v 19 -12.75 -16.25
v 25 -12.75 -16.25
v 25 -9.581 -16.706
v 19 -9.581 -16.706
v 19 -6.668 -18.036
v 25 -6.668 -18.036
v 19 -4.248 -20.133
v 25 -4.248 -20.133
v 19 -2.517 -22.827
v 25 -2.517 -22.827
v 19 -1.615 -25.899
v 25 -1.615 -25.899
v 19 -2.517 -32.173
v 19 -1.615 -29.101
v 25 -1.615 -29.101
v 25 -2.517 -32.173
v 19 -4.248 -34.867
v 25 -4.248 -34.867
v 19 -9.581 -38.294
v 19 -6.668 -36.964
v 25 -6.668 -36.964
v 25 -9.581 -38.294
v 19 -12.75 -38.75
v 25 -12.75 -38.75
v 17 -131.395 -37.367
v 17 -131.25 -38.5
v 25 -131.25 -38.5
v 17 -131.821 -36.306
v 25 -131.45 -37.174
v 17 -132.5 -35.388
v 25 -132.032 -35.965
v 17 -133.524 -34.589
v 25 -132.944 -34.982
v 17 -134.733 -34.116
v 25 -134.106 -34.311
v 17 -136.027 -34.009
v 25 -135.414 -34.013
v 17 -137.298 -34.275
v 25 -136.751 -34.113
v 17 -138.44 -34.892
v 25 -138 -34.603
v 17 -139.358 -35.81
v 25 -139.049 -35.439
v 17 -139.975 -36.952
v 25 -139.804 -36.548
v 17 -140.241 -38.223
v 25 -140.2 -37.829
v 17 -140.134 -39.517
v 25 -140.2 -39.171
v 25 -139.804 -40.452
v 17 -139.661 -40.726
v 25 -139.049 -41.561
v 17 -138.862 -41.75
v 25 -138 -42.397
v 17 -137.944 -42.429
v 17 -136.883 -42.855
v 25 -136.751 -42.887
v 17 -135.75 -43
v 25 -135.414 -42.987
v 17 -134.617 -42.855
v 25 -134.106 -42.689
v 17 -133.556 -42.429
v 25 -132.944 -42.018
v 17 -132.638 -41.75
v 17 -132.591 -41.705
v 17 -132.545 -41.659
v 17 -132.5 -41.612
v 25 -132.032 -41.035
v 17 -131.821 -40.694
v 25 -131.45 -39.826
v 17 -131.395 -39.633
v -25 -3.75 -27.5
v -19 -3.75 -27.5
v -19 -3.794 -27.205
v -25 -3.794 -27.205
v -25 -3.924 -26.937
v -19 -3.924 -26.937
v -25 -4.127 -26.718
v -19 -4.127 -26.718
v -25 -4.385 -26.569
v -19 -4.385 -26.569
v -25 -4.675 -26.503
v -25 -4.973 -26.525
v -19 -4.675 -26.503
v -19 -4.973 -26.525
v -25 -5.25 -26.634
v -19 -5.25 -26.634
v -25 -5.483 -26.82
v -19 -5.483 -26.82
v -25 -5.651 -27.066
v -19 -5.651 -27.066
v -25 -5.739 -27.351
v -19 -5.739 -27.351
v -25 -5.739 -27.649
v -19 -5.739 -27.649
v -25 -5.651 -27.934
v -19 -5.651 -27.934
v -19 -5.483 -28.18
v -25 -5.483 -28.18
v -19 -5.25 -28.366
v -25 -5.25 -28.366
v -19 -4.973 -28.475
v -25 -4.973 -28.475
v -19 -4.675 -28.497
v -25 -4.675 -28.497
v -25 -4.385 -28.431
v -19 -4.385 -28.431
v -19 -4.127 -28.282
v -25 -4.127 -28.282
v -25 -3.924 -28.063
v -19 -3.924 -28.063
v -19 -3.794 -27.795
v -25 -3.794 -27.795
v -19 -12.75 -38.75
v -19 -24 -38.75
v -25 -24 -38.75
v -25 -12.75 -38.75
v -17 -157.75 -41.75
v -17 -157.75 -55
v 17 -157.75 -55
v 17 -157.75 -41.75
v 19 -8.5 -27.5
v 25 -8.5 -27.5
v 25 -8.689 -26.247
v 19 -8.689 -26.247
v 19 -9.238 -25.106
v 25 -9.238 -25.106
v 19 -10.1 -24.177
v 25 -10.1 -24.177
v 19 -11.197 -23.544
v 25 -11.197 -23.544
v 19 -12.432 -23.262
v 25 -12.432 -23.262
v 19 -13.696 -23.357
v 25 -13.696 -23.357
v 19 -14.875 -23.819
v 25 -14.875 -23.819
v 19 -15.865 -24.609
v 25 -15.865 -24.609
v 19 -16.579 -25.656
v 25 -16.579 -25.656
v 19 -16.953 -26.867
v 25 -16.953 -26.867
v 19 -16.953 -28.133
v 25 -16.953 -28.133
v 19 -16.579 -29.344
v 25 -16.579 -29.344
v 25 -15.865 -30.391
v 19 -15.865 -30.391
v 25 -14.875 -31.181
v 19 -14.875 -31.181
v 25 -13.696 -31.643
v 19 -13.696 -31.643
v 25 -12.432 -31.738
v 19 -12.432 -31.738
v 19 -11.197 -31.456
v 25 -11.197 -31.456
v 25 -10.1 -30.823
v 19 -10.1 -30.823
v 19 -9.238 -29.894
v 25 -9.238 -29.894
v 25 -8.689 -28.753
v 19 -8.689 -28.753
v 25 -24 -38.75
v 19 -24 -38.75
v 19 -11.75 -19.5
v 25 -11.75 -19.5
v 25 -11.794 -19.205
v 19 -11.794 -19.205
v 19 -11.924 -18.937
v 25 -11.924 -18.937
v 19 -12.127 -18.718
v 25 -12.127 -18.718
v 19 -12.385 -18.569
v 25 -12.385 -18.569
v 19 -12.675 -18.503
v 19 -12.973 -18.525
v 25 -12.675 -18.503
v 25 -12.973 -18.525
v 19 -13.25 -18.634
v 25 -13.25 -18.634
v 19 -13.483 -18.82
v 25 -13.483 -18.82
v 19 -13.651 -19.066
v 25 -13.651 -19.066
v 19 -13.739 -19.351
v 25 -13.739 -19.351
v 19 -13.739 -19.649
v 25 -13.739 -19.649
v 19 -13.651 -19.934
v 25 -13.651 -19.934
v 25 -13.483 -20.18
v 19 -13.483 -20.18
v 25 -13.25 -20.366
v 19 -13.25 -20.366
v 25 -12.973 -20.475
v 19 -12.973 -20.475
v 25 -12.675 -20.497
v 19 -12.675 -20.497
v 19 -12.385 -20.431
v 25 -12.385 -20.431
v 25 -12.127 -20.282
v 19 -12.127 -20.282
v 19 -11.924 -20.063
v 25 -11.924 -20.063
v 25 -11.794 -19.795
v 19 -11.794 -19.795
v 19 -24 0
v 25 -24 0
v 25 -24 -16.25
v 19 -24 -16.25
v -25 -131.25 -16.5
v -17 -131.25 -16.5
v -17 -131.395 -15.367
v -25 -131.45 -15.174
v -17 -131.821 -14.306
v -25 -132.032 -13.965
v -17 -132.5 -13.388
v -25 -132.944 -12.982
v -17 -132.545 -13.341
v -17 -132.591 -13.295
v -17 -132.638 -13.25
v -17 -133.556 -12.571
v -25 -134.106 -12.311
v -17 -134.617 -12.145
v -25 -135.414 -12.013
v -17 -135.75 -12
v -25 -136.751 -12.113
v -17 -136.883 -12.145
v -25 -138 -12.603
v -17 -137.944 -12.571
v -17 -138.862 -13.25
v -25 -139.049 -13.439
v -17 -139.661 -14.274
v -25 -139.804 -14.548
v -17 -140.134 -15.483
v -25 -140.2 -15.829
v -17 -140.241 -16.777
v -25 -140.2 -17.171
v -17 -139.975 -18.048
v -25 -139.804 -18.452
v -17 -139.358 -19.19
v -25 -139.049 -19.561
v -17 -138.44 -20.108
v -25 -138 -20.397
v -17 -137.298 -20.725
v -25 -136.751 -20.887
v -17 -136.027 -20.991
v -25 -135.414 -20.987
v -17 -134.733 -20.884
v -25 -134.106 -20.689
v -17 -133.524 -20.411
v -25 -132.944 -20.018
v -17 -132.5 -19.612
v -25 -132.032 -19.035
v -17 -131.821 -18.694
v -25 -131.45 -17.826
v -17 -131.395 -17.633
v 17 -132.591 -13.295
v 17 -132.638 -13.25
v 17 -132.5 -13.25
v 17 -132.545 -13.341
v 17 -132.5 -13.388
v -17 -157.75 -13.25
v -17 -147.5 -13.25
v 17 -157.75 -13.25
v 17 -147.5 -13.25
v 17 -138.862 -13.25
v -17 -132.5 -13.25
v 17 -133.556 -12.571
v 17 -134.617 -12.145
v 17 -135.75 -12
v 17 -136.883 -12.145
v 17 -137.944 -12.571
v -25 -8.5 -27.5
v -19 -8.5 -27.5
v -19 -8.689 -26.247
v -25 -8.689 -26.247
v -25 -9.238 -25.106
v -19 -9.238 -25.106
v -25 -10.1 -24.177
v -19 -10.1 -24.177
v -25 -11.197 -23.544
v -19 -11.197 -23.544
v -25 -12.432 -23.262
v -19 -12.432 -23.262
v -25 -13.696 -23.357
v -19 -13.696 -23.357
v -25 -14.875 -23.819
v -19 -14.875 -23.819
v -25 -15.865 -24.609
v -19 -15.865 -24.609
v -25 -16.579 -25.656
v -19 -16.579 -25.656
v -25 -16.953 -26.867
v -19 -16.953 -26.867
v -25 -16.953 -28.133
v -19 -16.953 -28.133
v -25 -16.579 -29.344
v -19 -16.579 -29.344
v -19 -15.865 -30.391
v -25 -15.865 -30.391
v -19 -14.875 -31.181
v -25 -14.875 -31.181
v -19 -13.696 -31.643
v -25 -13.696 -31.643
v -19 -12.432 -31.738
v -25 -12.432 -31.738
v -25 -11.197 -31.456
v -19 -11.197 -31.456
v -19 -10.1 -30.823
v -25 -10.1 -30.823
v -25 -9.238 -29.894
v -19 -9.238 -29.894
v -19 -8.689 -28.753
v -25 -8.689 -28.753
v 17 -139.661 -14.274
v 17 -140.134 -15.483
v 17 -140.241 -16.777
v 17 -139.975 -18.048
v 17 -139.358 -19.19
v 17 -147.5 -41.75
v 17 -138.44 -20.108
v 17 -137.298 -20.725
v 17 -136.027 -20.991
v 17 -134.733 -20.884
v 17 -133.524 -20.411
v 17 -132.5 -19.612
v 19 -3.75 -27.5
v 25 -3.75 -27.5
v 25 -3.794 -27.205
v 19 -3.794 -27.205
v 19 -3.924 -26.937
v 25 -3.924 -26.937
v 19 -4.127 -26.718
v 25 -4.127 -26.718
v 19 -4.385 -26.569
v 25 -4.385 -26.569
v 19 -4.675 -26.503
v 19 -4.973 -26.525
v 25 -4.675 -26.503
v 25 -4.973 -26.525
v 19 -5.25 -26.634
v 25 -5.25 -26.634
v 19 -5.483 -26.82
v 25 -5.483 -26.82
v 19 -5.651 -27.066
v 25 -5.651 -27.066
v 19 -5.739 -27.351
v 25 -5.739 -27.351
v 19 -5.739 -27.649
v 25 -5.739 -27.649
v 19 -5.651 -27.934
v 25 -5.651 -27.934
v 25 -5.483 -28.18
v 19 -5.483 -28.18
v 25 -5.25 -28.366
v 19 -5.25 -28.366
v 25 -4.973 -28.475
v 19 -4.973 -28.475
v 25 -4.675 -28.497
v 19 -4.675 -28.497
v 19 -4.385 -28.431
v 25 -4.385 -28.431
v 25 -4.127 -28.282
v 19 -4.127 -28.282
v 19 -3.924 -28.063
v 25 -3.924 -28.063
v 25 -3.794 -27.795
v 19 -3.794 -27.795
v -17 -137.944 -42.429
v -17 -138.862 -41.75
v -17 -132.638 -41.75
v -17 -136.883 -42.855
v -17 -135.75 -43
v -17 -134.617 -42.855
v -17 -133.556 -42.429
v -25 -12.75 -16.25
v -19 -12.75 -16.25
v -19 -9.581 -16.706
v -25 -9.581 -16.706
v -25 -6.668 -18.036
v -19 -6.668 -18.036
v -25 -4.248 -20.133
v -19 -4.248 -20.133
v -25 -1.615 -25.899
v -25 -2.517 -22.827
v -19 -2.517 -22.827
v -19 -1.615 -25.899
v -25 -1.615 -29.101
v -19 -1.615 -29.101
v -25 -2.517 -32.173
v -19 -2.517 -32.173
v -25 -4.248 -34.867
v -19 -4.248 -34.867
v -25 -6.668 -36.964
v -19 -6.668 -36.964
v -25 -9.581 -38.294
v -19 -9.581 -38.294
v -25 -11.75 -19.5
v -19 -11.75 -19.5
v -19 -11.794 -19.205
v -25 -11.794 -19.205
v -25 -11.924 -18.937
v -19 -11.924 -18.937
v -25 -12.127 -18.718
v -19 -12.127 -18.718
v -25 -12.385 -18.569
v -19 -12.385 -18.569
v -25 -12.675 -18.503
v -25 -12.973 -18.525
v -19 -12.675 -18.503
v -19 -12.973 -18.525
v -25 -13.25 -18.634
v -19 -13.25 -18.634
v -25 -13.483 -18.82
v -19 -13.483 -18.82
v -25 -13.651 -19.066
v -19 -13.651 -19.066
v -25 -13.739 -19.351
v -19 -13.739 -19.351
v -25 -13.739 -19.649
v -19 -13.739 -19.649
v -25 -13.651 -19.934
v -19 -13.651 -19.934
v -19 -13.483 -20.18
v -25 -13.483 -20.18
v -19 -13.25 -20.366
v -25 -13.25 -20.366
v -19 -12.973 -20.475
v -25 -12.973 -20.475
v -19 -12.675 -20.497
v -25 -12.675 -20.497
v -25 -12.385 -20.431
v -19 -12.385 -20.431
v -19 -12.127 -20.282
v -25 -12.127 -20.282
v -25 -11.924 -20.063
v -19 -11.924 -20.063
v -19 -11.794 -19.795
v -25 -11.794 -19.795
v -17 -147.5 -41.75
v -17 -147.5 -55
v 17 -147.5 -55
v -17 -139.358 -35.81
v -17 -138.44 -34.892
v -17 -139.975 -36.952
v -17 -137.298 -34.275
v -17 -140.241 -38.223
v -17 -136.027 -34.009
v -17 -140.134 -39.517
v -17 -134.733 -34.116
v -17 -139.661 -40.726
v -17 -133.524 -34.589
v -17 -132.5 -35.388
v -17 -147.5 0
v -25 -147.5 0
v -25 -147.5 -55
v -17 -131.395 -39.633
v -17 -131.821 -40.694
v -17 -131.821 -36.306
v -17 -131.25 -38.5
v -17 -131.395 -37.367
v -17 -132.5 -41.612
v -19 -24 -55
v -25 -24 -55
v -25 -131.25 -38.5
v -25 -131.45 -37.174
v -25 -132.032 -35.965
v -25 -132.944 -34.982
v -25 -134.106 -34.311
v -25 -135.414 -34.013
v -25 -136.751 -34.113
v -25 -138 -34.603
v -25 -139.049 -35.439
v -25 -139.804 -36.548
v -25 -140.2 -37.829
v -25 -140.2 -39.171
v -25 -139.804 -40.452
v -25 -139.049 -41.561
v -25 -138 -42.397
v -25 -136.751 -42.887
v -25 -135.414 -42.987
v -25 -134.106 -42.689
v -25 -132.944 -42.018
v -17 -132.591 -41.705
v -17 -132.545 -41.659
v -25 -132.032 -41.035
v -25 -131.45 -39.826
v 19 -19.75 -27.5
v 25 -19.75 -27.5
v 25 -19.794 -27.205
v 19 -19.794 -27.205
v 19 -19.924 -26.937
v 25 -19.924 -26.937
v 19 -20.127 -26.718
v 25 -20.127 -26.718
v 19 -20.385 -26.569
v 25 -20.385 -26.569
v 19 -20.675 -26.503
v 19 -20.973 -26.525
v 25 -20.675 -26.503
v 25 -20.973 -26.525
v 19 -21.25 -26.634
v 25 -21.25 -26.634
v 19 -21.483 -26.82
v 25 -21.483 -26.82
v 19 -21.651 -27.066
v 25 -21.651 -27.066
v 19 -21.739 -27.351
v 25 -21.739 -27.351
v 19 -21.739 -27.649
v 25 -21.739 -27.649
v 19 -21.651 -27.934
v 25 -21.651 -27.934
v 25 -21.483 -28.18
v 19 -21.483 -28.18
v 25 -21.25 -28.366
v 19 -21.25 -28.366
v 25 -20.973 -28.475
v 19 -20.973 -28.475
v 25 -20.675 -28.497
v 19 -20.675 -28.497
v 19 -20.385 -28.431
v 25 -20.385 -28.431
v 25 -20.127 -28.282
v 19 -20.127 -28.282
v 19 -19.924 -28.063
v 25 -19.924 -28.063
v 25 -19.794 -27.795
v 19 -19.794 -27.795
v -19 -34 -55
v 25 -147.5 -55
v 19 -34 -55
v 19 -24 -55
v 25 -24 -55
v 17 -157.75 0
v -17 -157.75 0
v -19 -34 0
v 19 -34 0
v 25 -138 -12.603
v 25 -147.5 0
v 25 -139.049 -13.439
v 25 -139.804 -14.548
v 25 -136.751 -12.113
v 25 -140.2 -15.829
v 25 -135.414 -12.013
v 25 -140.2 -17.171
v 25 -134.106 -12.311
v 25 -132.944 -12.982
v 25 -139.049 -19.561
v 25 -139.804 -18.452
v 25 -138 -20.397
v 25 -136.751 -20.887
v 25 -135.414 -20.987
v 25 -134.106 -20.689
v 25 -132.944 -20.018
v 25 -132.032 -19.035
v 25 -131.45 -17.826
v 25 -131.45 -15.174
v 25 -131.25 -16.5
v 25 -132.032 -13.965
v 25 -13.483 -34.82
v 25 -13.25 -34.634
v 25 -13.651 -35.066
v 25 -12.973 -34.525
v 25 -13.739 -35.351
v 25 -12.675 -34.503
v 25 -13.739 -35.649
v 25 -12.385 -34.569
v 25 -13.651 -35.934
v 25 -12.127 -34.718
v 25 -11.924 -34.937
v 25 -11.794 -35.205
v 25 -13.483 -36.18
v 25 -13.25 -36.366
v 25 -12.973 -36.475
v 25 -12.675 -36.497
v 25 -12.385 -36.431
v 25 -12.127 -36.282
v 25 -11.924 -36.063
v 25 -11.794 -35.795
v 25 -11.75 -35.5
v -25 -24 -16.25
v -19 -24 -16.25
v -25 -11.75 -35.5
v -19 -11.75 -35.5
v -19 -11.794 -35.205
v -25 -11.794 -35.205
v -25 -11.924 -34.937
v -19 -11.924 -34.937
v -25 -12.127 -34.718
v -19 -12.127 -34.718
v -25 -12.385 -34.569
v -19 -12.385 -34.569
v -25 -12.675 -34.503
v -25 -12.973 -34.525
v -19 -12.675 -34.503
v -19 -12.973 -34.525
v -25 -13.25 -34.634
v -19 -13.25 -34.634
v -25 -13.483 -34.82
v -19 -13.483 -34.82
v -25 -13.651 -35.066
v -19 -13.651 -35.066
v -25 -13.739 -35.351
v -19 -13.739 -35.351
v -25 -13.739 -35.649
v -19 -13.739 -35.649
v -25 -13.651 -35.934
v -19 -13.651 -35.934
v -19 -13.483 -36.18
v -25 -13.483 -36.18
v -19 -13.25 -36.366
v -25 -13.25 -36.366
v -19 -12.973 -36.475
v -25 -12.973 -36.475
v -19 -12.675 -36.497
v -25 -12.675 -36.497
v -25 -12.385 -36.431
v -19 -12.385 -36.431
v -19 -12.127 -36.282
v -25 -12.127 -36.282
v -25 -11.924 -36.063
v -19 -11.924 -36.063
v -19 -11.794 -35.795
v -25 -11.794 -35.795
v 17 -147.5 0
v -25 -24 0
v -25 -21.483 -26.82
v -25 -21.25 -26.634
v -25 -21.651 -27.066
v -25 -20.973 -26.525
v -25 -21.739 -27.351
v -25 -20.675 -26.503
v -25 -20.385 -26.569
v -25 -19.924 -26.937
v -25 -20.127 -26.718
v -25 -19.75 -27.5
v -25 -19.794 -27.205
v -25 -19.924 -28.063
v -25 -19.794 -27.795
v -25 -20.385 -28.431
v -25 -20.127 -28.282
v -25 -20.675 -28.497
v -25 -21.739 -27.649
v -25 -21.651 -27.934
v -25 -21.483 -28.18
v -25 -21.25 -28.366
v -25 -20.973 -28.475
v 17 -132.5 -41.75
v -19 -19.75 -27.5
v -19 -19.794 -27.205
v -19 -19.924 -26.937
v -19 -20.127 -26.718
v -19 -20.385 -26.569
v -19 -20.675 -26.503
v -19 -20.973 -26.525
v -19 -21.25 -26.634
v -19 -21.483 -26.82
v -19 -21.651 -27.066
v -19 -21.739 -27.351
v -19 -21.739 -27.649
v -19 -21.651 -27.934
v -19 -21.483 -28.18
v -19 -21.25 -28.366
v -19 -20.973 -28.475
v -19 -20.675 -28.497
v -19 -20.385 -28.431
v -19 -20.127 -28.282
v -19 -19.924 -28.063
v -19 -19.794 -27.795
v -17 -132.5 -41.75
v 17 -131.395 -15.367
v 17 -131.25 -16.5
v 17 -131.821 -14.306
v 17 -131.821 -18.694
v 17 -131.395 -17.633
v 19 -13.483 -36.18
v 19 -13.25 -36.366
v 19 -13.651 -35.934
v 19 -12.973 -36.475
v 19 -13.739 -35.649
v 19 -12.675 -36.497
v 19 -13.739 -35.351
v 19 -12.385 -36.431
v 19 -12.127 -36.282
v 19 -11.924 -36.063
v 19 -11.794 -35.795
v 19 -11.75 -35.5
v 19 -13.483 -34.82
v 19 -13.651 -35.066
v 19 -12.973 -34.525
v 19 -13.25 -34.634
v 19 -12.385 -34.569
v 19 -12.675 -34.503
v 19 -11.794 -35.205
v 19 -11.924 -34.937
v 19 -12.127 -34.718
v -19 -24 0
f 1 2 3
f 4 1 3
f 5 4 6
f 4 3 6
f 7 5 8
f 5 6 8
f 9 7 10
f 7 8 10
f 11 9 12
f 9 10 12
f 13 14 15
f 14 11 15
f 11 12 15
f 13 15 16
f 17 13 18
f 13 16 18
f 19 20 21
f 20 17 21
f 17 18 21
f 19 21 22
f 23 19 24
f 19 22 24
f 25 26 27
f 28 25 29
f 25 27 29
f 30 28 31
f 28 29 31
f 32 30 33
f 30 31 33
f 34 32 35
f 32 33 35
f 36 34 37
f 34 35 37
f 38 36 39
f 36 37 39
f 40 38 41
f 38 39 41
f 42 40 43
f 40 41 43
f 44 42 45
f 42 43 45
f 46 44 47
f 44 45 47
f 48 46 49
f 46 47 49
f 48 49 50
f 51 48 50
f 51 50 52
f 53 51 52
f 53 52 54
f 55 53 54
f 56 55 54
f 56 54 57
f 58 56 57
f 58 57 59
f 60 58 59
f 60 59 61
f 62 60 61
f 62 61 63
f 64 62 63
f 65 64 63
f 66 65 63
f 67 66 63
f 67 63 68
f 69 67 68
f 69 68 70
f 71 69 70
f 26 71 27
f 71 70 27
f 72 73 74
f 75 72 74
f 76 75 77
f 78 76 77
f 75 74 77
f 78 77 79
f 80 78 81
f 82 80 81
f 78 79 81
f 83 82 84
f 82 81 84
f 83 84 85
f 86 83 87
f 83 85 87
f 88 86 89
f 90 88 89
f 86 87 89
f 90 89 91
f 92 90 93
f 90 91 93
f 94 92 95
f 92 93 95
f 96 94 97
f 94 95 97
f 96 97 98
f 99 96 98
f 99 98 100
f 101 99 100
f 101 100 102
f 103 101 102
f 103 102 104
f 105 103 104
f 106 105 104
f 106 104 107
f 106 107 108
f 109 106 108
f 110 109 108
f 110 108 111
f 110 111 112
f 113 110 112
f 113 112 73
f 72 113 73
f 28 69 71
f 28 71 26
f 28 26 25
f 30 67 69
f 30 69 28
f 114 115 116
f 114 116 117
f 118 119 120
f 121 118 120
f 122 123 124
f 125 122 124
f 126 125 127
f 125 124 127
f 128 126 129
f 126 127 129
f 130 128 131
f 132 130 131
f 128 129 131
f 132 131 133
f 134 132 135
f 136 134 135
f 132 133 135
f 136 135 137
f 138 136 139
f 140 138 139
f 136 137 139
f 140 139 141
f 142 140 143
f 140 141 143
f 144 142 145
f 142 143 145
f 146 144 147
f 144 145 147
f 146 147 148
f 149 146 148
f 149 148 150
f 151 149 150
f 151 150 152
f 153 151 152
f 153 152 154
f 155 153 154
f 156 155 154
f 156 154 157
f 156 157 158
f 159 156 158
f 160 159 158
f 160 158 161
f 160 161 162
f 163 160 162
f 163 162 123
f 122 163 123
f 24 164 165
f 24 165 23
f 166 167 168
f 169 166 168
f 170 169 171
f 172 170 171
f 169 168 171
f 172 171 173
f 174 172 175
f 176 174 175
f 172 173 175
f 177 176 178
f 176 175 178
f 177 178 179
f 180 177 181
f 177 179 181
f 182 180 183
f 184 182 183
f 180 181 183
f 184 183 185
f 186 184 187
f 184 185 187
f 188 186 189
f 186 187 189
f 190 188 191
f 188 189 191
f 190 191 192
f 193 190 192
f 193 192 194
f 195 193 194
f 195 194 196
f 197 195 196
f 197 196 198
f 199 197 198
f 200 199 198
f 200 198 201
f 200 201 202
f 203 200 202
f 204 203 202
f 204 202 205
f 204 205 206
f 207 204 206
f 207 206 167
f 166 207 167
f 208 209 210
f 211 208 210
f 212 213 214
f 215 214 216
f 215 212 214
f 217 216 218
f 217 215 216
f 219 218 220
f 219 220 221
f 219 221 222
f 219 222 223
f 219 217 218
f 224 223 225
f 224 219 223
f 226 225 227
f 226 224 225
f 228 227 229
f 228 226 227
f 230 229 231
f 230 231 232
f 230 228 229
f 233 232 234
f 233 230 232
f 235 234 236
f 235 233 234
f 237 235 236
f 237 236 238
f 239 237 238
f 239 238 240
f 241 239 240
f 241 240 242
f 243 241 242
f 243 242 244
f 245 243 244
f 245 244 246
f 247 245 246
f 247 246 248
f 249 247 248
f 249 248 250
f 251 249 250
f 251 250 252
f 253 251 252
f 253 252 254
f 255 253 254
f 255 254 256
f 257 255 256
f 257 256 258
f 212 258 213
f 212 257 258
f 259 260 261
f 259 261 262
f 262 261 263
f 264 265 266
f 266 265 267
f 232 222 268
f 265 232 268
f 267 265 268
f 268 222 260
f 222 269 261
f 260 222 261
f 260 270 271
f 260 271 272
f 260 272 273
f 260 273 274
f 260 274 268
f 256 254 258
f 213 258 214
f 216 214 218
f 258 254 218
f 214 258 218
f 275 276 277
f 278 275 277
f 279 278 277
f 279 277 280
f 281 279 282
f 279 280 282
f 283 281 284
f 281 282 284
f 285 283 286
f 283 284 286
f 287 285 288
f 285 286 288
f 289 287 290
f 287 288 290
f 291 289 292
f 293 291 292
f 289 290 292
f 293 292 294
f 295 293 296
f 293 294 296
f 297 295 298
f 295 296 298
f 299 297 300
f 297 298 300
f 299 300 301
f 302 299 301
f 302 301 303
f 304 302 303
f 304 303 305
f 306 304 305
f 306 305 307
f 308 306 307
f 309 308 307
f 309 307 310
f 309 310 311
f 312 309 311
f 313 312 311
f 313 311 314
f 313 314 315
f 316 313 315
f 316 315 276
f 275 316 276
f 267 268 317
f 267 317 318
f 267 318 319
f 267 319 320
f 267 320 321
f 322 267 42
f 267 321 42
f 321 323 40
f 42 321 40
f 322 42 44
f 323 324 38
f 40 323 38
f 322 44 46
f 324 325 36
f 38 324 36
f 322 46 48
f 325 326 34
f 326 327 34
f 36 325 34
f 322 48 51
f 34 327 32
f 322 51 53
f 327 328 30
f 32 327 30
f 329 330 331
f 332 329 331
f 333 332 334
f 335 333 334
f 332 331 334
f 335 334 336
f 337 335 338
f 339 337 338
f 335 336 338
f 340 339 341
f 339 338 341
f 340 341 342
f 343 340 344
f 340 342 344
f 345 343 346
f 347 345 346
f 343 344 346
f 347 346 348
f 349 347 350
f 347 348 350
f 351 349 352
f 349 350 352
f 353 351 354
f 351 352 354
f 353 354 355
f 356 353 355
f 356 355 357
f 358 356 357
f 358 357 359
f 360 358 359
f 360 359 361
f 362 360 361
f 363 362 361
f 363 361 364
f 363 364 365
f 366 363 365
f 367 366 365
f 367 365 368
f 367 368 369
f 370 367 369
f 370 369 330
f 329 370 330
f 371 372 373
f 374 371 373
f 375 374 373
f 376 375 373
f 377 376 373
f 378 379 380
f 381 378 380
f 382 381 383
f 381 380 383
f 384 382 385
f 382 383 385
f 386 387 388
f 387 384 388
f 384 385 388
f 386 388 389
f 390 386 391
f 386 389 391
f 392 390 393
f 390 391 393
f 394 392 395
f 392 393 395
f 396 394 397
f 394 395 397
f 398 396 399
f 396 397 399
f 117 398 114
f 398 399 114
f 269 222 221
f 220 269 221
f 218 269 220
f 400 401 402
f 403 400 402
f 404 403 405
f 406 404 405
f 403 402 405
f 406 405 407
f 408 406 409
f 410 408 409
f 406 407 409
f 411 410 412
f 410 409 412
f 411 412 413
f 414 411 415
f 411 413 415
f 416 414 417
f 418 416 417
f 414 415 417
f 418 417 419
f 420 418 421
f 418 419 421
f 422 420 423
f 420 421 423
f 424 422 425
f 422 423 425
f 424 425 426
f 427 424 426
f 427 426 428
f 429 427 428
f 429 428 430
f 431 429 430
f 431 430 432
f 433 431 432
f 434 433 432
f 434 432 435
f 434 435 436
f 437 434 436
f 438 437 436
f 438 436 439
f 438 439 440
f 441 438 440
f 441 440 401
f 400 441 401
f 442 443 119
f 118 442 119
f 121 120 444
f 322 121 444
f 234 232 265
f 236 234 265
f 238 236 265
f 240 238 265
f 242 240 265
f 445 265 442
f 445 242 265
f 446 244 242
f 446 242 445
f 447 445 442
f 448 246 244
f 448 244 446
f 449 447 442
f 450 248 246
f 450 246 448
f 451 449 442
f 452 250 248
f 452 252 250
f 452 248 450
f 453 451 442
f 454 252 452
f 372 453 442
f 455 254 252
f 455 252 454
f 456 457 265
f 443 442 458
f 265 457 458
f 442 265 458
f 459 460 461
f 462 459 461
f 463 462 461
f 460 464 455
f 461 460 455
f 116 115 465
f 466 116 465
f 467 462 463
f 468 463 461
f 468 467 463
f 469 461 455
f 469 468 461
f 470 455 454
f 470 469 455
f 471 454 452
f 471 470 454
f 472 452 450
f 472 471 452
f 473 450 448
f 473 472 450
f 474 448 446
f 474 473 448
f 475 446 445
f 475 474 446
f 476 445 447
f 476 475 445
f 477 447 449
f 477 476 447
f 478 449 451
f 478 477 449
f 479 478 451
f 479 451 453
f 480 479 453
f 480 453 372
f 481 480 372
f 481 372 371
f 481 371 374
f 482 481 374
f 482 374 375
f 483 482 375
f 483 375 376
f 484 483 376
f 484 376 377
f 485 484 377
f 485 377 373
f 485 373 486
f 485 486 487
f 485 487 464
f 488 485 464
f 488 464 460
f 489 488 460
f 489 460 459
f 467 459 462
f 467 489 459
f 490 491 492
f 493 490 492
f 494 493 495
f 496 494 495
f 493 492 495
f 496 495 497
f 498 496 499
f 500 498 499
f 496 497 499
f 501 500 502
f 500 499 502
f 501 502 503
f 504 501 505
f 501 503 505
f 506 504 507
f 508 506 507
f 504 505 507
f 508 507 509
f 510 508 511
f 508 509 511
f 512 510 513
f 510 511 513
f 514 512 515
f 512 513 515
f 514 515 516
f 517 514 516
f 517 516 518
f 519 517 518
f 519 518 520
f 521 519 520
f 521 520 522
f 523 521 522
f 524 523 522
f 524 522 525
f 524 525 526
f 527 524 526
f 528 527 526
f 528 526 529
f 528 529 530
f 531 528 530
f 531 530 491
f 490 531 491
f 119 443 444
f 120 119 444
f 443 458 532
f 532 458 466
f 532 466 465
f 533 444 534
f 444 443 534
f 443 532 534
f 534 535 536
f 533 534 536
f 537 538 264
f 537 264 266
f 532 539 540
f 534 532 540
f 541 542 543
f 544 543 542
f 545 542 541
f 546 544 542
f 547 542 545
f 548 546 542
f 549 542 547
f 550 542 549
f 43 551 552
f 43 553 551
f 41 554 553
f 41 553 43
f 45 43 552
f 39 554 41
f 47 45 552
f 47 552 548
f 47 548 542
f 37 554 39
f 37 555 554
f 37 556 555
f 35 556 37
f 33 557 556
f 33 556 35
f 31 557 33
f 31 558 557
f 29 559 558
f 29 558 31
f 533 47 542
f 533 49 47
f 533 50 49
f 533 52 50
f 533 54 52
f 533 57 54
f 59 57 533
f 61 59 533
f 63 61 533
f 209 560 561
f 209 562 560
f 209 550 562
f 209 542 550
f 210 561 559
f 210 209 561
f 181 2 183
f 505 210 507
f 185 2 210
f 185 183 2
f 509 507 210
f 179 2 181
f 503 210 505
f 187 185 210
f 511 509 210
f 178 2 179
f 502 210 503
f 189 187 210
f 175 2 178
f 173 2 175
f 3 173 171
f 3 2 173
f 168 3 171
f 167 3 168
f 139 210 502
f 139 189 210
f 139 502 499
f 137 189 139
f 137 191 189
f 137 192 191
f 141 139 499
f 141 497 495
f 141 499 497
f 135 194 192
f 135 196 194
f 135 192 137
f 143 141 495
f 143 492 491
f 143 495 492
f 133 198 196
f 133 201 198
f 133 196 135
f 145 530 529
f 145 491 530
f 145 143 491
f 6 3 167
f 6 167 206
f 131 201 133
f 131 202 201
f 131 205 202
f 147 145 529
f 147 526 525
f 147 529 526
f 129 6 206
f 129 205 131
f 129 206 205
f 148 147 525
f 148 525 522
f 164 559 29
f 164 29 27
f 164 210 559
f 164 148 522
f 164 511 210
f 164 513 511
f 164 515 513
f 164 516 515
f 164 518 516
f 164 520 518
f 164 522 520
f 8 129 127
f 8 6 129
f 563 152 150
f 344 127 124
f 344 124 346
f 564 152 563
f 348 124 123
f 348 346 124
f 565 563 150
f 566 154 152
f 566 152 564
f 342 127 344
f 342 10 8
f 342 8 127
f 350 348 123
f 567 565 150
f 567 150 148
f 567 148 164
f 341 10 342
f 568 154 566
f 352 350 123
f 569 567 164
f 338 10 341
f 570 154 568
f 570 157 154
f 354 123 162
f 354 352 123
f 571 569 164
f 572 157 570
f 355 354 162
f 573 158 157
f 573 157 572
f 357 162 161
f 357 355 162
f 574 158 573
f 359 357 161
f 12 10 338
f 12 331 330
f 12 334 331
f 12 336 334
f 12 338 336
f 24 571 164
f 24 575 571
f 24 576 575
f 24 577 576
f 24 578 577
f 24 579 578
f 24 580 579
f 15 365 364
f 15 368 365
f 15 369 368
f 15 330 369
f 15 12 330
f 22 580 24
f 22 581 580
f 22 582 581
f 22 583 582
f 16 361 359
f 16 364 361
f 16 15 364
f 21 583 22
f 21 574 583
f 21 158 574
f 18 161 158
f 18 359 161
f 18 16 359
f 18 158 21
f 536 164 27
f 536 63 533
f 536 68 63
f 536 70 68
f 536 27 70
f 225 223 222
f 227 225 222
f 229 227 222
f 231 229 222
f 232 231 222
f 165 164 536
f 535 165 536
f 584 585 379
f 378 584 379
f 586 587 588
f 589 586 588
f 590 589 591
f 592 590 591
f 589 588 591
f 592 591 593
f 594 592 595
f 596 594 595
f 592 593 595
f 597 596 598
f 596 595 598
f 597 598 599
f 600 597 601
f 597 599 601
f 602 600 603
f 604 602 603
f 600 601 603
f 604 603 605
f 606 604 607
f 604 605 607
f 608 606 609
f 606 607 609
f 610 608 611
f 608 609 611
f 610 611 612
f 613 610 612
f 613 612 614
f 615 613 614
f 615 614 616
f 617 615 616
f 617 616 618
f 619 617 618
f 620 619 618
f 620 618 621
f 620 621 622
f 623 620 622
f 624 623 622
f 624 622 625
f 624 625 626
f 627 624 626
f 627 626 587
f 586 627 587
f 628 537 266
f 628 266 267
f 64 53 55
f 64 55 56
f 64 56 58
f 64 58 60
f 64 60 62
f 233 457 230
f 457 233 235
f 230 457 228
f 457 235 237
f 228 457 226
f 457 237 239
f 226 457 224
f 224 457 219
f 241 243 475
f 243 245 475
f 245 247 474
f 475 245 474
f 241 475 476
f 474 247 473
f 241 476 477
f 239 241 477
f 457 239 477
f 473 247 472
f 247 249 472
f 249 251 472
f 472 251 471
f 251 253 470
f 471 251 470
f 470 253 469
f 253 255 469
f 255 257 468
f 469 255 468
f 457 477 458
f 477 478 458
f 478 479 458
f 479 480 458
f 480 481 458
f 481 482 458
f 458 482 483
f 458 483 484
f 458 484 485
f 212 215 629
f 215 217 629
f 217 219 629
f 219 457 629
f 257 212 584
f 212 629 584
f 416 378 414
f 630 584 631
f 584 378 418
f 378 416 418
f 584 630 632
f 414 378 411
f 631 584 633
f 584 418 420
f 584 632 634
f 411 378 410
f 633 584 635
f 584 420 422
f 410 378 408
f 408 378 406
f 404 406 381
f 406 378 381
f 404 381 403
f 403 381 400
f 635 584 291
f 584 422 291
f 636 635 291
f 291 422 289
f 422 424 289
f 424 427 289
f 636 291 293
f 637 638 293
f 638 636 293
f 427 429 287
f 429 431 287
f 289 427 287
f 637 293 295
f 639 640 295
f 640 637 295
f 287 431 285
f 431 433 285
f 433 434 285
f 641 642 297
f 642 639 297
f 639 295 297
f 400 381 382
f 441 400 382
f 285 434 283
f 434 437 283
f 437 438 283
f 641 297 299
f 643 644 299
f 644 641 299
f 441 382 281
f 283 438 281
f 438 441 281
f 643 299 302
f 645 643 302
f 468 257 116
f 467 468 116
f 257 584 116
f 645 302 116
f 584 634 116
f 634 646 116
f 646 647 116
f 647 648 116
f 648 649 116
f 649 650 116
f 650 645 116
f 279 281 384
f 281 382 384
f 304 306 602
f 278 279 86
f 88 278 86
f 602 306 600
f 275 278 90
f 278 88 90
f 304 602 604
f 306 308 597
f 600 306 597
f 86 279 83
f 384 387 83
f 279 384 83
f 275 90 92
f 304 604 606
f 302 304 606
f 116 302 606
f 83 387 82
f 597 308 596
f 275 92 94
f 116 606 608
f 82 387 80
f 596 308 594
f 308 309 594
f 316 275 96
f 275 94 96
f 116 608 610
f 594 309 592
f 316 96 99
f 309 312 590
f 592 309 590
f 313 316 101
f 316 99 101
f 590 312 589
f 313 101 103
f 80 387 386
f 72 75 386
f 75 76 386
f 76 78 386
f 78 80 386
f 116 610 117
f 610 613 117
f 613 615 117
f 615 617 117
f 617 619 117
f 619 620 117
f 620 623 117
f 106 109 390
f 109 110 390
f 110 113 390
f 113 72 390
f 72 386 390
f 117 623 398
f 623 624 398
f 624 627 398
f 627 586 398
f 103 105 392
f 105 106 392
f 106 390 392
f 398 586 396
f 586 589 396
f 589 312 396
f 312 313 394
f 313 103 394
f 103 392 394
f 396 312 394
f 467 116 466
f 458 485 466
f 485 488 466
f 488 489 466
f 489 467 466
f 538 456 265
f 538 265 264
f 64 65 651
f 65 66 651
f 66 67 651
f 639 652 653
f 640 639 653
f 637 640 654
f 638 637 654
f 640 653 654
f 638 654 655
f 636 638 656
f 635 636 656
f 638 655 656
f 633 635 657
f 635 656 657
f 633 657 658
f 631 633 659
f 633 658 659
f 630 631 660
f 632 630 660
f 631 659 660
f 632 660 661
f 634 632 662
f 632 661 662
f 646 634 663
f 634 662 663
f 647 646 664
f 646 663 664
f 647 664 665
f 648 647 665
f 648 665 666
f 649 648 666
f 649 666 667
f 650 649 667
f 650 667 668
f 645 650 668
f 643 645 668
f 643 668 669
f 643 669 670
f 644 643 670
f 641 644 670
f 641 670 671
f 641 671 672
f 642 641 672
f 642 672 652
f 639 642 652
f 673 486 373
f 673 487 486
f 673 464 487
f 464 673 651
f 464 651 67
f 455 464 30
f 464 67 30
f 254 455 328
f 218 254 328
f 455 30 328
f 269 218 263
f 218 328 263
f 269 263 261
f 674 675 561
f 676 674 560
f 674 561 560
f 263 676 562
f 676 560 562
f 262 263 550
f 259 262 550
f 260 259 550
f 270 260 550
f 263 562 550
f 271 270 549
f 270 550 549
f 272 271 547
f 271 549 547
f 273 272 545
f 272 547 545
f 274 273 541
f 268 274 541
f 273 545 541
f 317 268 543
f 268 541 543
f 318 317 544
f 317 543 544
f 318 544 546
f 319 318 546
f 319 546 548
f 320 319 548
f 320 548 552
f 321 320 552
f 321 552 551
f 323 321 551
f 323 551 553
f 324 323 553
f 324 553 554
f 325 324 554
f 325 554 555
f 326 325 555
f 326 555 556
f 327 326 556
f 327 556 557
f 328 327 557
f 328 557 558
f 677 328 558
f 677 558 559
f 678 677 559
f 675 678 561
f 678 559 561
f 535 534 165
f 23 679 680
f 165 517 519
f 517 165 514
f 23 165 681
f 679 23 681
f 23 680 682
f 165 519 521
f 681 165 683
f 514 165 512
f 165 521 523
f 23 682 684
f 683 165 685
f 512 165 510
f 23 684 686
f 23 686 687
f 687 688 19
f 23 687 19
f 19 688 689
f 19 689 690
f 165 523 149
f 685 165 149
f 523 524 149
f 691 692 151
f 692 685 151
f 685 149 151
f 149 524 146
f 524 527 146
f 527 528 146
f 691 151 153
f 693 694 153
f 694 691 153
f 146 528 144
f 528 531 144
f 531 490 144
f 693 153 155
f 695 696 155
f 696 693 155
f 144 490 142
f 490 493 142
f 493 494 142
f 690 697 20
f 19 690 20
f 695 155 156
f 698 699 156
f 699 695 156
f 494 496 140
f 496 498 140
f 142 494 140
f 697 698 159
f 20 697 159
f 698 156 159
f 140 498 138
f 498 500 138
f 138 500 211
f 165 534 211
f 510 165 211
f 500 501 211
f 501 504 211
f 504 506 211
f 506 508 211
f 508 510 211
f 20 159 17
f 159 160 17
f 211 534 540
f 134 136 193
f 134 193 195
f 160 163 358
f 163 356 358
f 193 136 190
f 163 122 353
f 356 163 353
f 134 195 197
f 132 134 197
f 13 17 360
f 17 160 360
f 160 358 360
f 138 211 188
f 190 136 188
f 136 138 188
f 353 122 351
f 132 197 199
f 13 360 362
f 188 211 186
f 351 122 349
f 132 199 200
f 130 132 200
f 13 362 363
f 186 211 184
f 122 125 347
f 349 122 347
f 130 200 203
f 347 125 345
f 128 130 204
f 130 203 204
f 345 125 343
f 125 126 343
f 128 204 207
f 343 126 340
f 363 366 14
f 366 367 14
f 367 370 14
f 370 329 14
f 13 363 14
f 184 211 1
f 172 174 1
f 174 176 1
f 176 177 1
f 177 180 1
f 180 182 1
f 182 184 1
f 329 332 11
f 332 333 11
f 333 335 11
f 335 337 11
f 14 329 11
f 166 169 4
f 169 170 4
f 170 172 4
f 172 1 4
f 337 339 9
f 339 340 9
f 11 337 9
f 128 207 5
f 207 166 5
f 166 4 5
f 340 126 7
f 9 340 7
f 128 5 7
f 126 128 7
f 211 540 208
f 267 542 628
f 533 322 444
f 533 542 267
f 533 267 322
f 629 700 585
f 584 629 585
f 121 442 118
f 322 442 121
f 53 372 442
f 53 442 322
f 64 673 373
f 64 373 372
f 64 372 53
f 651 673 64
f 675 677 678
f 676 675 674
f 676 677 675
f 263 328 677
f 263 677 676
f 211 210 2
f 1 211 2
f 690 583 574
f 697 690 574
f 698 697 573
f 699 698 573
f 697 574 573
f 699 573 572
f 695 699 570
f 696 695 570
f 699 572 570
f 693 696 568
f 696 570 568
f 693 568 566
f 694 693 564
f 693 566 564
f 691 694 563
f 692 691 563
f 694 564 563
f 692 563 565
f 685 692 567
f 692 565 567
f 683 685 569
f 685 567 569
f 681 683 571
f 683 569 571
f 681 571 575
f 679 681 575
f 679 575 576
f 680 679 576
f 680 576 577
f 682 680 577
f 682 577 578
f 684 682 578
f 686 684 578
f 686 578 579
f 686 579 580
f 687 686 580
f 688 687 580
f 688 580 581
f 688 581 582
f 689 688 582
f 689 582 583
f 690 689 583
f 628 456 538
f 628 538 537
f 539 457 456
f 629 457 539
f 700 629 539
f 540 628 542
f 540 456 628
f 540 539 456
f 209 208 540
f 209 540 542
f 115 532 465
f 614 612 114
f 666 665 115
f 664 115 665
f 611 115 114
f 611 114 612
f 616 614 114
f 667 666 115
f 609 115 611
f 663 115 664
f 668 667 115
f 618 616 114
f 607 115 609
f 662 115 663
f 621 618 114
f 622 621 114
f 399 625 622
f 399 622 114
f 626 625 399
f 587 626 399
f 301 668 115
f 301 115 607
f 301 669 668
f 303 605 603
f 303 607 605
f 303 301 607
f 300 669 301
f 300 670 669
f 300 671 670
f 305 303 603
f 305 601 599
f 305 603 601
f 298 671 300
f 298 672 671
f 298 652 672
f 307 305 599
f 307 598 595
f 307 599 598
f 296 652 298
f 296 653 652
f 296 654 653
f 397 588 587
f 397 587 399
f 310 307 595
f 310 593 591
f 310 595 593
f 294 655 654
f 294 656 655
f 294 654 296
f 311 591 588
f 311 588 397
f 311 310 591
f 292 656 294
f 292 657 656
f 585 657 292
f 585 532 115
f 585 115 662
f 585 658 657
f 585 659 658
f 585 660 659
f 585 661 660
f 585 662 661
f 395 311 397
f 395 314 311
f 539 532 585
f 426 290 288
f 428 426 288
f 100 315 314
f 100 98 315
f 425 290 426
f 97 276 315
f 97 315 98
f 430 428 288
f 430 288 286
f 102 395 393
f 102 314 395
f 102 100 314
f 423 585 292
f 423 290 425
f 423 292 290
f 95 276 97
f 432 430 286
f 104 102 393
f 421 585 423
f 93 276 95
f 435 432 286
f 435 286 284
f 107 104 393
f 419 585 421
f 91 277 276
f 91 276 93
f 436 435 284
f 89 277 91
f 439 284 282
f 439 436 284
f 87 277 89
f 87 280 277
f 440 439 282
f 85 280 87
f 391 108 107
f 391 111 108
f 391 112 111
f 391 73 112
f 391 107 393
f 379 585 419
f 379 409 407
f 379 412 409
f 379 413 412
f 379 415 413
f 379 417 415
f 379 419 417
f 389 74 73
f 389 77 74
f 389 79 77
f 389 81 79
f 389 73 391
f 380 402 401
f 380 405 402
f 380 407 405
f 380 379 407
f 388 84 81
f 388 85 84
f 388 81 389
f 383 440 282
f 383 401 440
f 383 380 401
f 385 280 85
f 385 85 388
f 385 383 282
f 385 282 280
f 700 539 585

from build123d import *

# Parameters (mm, degrees)
SKETCH1_W           = 50
SKETCH1_H           = 170
BOSS_EXTRUDE1_DEPTH = 55
SKETCH2_W           = 34
SKETCH2_H           = 27
CUT_EXTRUDE1_DEPTH  = 181.416185527
SKETCH3_W           = 10
SKETCH3_H           = 24
SKETCH3_R           = 4.25
SKETCH3_R_2         = 1
CUT_EXTRUDE2_DEPTH  = 186.539753153
SKETCH4_W           = 2
SKETCH4_H           = 24
CUT_EXTRUDE3_DEPTH  = 178.623196683
SKETCH5_W           = 6.25
SKETCH5_H           = 11.25
CUT_EXTRUDE4_DEPTH  = 186.539753153
SKETCH6_W           = 38
SKETCH6_H           = 10
CUT_EXTRUDE5_DEPTH  = 181.416185527
SKETCH8_W           = 13.25
SKETCH8_H           = 2.25
CUT_EXTRUDE7_DEPTH  = 186.539753153
SKETCH9_W           = 34
SKETCH9_H           = 35.25
CUT_EXTRUDE8_DEPTH  = 179.297679458
SKETCH11_W          = 13.25
SKETCH11_H          = 20.25
CUT_EXTRUDE9_DEPTH  = 184.480414486
SKETCH12_W          = 28.5
SKETCH12_H          = 15
BOSS_EXTRUDE2_DEPTH = 8
SKETCH14_W          = 34
SKETCH14_H          = 15
SKETCH14_H_2        = 10.25
BOSS_EXTRUDE3_DEPTH = 13.25
SKETCH16_R          = 4.5
SKETCH16_R_2        = 2.5
CUT_EXTRUDE13_DEPTH = 8


with BuildPart() as part:
    # Sketch1 → Boss-Extrude1 (new body)
    with BuildSketch(Plane.XY):
        with Locations((0, -85)):
            Rectangle(SKETCH1_W, SKETCH1_H)
    extrude(amount=-BOSS_EXTRUDE1_DEPTH)

    # Sketch2 → Cut-Extrude1 (cut, through all)
    with BuildSketch(Plane.XY):
        with Locations((0, -13.5)):
            Rectangle(SKETCH2_W, SKETCH2_H)
    extrude(amount=-CUT_EXTRUDE1_DEPTH, mode=Mode.SUBTRACT)

    # Sketch3 → Cut-Extrude2 (cut, through all)
    with BuildSketch(Plane(origin=(25, 0, 0), x_dir=(0, 0, -1), z_dir=(1, 0, 0))):
        with Locations((50, -12)):
            Rectangle(SKETCH3_W, SKETCH3_H)
        with Locations((5, -12)):
            Rectangle(SKETCH3_W, SKETCH3_H)
        with Locations(Location((27.5, -12.75, 0), (0, 0, 90))):
            Circle(SKETCH3_R)
        with Locations(Location((35.5, -12.75, 0), (0, 0, 90))):
            Circle(SKETCH3_R_2)
        with Locations(Location((27.5, -4.75, 0), (0, 0, 90))):
            Circle(SKETCH3_R_2)
        with Locations(Location((27.5, -20.75, 0), (0, 0, 90))):
            Circle(SKETCH3_R_2)
        with Locations(Location((19.5, -12.75, 0), (0, 0, 90))):
            Circle(SKETCH3_R_2)
    extrude(amount=-CUT_EXTRUDE2_DEPTH, mode=Mode.SUBTRACT)

    # Sketch4 → Cut-Extrude3 (cut, through all)
    with BuildSketch(Plane.XY.offset(-10)):
        with Locations((-18, -12)):
            Rectangle(SKETCH4_W, SKETCH4_H)
        with Locations((18, -12)):
            Rectangle(SKETCH4_W, SKETCH4_H)
    extrude(amount=-CUT_EXTRUDE3_DEPTH, mode=Mode.SUBTRACT)

    # Sketch5 → Cut-Extrude4 (cut, through all)
    with BuildSketch(Plane(origin=(25, 0, 0), x_dir=(0, 0, -1), z_dir=(1, 0, 0))):
        with BuildLine():
            Line((45, 0), (10, 0))
            Line((10, 0), (10, -12.75))
            Line((10, -12.75), (16.25, -12.75))
            ThreePointArc((16.25, -12.75), (27.5, -1.5), (38.75, -12.75))
            Line((38.75, -12.75), (45, -12.75))
            Line((45, -12.75), (45, 0))
        make_face()
        with Locations((13.125, -18.375)):
            Rectangle(SKETCH5_W, SKETCH5_H)
        with Locations((41.875, -18.375)):
            Rectangle(SKETCH5_W, SKETCH5_H)
    extrude(amount=-CUT_EXTRUDE4_DEPTH, mode=Mode.SUBTRACT)

    # Sketch6 → Cut-Extrude5 (cut, through all)
    with BuildSketch(Plane.XY):
        with Locations((0, -29)):
            Rectangle(SKETCH6_W, SKETCH6_H)
    extrude(amount=-CUT_EXTRUDE5_DEPTH, mode=Mode.SUBTRACT)

    # Sketch8 → Cut-Extrude7 (cut, through all)
    with BuildSketch(Plane(origin=(25, 0, 0), x_dir=(0, 0, -1), z_dir=(1, 0, 0))):
        with BuildLine():
            Line((27.5, -157.5), (27.5, -132.5))
            Line((27.5, -132.5), (13.25, -132.5))
            Line((13.25, -132.5), (13.25, -167.75))
            Line((13.25, -167.75), (17.25, -167.75))
            ThreePointArc((17.25, -167.75), (20.252155493, -160.502155493), (27.5, -157.5))
        make_face()
        with BuildLine():
            Line((41.75, -167.75), (41.75, -132.5))
            Line((41.75, -132.5), (27.5, -132.5))
            Line((27.5, -132.5), (27.5, -157.5))
            ThreePointArc((27.5, -157.5), (34.747844507, -160.502155493), (37.75, -167.75))
            Line((37.75, -167.75), (41.75, -167.75))
        make_face()
        with Locations((48.375, -168.875)):
            Rectangle(SKETCH8_W, SKETCH8_H)
        with Locations((6.625, -168.875)):
            Rectangle(SKETCH8_W, SKETCH8_H)
        with BuildLine():
            Line((17.25, -167.75), (13.25, -167.75))
            Line((13.25, -167.75), (13.25, -170))
            Line((13.25, -170), (17.5, -170))
            ThreePointArc((17.5, -170), (17.31269172, -168.881923142), (17.25, -167.75))
        make_face()
        with BuildLine():
            Line((41.75, -170), (41.75, -167.75))
            Line((41.75, -167.75), (37.75, -167.75))
            ThreePointArc((37.75, -167.75), (37.68730828, -168.881923142), (37.5, -170))
            Line((37.5, -170), (41.75, -170))
        make_face()
        with BuildLine():
            Line((27.5, -167.75), (27.5, -157.5))
            ThreePointArc((27.5, -157.5), (20.252155493, -160.502155493), (17.25, -167.75))
            Line((17.25, -167.75), (27.5, -167.75))
        make_face()
        with BuildLine():
            ThreePointArc((37.75, -167.75), (34.747844507, -160.502155493), (27.5, -157.5))
            Line((27.5, -157.5), (27.5, -167.75))
            Line((27.5, -167.75), (37.75, -167.75))
        make_face()
        with BuildLine():
            Line((27.5, -170), (27.5, -167.75))
            Line((27.5, -167.75), (17.25, -167.75))
            ThreePointArc((17.25, -167.75), (17.31269172, -168.881923142), (17.5, -170))
            Line((17.5, -170), (27.5, -170))
        make_face()
        with BuildLine():
            ThreePointArc((37.5, -170), (37.68730828, -168.881923142), (37.75, -167.75))
            Line((37.75, -167.75), (27.5, -167.75))
            Line((27.5, -167.75), (27.5, -170))
            Line((27.5, -170), (37.5, -170))
        make_face()
    extrude(amount=-CUT_EXTRUDE7_DEPTH, mode=Mode.SUBTRACT)

    # Sketch9 → Cut-Extrude8 (cut, through all)
    with BuildSketch(Plane.XY):
        with Locations((0, -150.125)):
            Rectangle(SKETCH9_W, SKETCH9_H)
    extrude(amount=-CUT_EXTRUDE8_DEPTH, mode=Mode.SUBTRACT)

    # Sketch11 → Cut-Extrude9 (cut, through all)
    with BuildSketch(Plane(origin=(25, 0, 0), x_dir=(0, 0, -1), z_dir=(1, 0, 0))):
        with BuildLine():
            ThreePointArc((17.25, -167.75), (20.252155493, -160.502155493), (27.5, -157.5))
            Line((27.5, -157.5), (27.5, -147.5))
            Line((27.5, -147.5), (13.25, -147.5))
            Line((13.25, -147.5), (13.25, -167.75))
            Line((13.25, -167.75), (17.25, -167.75))
        make_face()
        with BuildLine():
            Line((27.5, -147.5), (27.5, -157.5))
            ThreePointArc((27.5, -157.5), (34.747844507, -160.502155493), (37.75, -167.75))
            Line((37.75, -167.75), (41.75, -167.75))
            Line((41.75, -167.75), (41.75, -147.5))
            Line((41.75, -147.5), (27.5, -147.5))
        make_face()
        with Locations((48.375, -157.625)):
            Rectangle(SKETCH11_W, SKETCH11_H)
        with Locations((6.625, -157.625)):
            Rectangle(SKETCH11_W, SKETCH11_H)
    extrude(amount=-CUT_EXTRUDE9_DEPTH, mode=Mode.SUBTRACT)

    # Sketch12 → Boss-Extrude2 (add)
    with BuildSketch(Plane(origin=(25, 0, 0), x_dir=(0, 0, -1), z_dir=(1, 0, 0))):
        with Locations((27.5, -140)):
            Rectangle(SKETCH12_W, SKETCH12_H)
    boss_extrude2 = extrude(amount=-BOSS_EXTRUDE2_DEPTH)

    # Mirror1: Boss-Extrude2 across plane
    add(boss_extrude2.mirror(Plane(origin=(0, 0, 0), x_dir=(0, 0, 1), z_dir=(1, 0, 0))))

    # Sketch14 → Boss-Extrude3 (add)
    with BuildSketch(Plane.XY):
        with Locations((0, -140)):
            Rectangle(SKETCH14_W, SKETCH14_H)
        with Locations((0, -152.625)):
            Rectangle(SKETCH14_W, SKETCH14_H_2)
    boss_extrude3 = extrude(amount=-BOSS_EXTRUDE3_DEPTH)

    # Mirror2: Boss-Extrude3 across plane
    add(boss_extrude3.mirror(Plane.XY.offset(-27.5)))

    # Sketch16 → Cut-Extrude13 (cut)
    # profile 1 of 3: a face of its own
    with BuildSketch(Plane(origin=(25, 0, 0), x_dir=(0, 0, -1), z_dir=(1, 0, 0))):
        with Locations(Location((16.5, -135.75, 0), (0, 0, 90))):
            Circle(SKETCH16_R)
        with Locations((16.5, -135.75)):
            Circle(SKETCH16_R_2, mode=Mode.SUBTRACT)
    # profile 2 of 3: a face of its own
    with BuildSketch(Plane(origin=(25, 0, 0), x_dir=(0, 0, -1), z_dir=(1, 0, 0))):
        with Locations((16.5, -135.75)):
            Circle(SKETCH16_R_2)
    # profile 3 of 3: a face of its own
    with BuildSketch(Plane(origin=(25, 0, 0), x_dir=(0, 0, -1), z_dir=(1, 0, 0))):
        with Locations(Location((38.5, -135.75, 0), (0, 0, 90))):
            Circle(SKETCH16_R)
    cut_extrude13 = extrude(amount=-CUT_EXTRUDE13_DEPTH, mode=Mode.SUBTRACT)

    # Mirror3: Cut-Extrude13 across plane
    add(cut_extrude13.mirror(Plane(origin=(0, 0, 0), x_dir=(0, 0, 1), z_dir=(1, 0, 0))), mode=Mode.SUBTRACT)


solid = part.part
